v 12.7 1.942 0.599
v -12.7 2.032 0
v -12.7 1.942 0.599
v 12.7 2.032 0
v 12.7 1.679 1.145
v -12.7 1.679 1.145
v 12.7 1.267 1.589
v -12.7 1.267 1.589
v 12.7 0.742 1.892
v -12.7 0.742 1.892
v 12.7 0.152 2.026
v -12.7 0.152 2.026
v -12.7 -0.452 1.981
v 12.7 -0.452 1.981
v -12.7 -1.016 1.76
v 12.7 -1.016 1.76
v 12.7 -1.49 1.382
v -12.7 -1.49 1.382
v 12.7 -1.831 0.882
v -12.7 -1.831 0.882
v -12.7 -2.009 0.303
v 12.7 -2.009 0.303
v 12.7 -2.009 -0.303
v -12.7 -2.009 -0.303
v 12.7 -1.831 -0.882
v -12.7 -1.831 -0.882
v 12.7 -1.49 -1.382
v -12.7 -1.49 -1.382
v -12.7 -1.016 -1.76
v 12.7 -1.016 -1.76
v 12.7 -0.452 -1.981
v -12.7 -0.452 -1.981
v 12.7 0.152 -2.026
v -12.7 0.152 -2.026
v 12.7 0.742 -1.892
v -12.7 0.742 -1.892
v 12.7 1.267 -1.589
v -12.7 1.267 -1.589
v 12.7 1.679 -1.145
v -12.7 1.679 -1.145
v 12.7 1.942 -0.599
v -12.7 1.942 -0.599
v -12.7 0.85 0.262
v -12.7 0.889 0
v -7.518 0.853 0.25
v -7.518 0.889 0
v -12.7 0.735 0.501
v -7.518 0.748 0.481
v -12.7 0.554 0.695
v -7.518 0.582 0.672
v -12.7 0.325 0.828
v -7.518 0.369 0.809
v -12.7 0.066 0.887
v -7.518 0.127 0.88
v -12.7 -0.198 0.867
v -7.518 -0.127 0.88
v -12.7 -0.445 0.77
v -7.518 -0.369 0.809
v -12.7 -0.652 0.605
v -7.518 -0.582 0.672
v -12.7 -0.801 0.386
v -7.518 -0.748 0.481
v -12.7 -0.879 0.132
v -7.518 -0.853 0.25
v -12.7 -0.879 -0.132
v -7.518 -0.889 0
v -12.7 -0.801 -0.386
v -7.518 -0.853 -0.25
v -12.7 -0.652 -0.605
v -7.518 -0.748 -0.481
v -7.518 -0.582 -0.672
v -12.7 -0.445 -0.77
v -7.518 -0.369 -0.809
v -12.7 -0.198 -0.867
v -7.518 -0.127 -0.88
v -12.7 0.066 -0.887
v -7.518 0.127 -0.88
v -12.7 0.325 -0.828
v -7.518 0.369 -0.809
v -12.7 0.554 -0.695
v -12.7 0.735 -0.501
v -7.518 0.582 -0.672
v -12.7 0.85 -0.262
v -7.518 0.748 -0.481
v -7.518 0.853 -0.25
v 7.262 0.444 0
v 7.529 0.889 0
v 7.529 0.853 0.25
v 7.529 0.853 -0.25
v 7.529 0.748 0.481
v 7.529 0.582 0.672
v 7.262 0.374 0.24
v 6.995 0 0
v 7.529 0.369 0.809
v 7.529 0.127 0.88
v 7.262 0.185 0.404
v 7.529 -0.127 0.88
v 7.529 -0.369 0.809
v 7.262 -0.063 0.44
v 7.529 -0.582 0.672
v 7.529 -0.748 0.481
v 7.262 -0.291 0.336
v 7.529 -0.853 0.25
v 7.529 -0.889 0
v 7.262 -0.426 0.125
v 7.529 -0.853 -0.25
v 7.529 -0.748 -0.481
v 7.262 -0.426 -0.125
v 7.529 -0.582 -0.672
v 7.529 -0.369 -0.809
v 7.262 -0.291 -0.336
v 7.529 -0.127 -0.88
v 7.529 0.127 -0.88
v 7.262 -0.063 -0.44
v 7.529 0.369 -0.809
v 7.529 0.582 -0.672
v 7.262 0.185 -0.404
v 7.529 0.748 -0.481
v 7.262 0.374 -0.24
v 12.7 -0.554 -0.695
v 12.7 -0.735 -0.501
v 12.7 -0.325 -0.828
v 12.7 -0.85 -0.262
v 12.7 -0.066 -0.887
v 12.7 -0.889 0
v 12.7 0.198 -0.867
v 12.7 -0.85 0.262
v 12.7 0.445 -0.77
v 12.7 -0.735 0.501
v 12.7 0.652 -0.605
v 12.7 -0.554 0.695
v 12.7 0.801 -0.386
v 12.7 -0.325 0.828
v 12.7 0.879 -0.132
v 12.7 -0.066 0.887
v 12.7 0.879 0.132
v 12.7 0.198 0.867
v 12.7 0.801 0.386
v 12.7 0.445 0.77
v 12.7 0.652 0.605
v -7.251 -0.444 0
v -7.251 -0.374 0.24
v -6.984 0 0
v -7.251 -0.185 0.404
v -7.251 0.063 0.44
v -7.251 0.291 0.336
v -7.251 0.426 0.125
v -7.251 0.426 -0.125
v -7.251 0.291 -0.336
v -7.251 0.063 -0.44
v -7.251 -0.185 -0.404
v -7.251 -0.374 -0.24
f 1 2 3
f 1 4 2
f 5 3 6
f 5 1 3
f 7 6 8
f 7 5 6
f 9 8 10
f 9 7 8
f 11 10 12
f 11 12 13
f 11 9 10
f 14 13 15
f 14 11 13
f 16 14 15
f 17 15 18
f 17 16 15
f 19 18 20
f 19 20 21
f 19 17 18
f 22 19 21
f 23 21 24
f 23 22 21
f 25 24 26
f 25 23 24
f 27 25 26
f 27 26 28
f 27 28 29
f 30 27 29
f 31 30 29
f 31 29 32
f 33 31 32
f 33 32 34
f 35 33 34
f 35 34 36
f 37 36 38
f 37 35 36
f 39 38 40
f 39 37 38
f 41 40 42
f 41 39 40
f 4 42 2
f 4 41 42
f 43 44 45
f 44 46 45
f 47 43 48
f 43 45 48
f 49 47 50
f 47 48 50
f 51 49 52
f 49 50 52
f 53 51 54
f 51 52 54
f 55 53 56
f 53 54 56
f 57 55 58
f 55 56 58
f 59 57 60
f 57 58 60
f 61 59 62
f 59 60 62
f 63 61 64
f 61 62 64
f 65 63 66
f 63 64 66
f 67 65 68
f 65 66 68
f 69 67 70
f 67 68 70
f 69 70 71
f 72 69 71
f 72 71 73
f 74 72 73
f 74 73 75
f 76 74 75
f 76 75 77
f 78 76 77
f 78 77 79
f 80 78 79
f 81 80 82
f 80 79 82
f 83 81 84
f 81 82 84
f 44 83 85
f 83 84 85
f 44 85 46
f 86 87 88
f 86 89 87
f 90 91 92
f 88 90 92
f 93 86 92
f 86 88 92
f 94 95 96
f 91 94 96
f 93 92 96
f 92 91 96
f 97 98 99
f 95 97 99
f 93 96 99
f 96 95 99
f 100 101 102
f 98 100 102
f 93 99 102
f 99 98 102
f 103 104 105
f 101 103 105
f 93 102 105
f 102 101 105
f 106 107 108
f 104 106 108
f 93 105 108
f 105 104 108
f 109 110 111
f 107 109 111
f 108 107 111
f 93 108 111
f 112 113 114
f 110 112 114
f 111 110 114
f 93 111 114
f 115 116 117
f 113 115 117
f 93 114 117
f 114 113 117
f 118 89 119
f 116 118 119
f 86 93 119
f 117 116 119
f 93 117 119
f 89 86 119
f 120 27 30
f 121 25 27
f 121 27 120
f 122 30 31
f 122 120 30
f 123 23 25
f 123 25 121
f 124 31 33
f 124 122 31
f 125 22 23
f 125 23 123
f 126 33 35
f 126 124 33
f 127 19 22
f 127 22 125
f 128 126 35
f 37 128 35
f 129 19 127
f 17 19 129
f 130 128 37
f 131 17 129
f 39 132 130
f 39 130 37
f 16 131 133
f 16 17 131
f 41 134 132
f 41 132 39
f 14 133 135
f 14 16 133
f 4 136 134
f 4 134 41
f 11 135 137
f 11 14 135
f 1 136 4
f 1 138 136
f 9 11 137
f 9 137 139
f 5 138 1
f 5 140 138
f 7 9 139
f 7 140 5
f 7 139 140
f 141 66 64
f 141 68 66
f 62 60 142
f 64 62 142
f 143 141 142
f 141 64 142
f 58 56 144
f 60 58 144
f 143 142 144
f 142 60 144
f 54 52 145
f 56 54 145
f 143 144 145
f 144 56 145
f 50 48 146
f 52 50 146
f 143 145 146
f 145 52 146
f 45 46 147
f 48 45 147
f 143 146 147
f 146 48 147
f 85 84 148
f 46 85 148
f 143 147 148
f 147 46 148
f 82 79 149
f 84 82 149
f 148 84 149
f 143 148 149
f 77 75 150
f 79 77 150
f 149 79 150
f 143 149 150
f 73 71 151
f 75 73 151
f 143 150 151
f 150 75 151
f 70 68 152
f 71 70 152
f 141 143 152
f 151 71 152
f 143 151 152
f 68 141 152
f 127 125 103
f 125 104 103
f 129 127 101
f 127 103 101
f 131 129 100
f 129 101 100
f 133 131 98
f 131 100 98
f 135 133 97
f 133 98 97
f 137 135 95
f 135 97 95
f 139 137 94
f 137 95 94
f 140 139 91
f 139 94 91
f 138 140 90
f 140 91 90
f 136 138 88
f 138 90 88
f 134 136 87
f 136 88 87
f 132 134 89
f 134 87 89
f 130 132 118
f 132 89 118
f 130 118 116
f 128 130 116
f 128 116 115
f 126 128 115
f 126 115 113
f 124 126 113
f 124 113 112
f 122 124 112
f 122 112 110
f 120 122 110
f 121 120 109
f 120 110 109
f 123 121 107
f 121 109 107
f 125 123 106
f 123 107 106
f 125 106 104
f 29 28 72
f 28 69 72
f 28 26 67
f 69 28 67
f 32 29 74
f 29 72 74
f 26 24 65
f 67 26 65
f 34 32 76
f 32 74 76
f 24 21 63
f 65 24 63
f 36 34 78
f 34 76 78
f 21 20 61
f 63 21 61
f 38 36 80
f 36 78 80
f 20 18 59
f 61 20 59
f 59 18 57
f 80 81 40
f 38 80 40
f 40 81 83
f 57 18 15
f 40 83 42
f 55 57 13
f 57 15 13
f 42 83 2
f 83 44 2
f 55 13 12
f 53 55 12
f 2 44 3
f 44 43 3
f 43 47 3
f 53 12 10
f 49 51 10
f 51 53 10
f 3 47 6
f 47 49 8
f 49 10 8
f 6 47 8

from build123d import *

# Parameters (mm, degrees)
F0_R     = 2.032
F1_DEPTH = 12.7
F3_D     = 1.778
F3_DEPTH = 5.1707142857
F3_TIP   = 0.5341650903
F5_D     = 1.778
F5_DEPTH = 5.1816
F5_TIP   = 0.5341650903


with BuildPart() as f1:
    # F0 (on Right) → F1 (new body, symmetric)
    with BuildSketch(Plane.YZ):
        Circle(F0_R)
    extrude(amount=F1_DEPTH, both=True)

    # F3
    with Locations(Plane.YZ.offset(12.7)):
        with Locations((0, 0)):
            Hole(F3_D / 2, depth=F3_DEPTH)
            with Locations((0, 0, -(F3_DEPTH + F3_TIP / 2))):  # 118° drill point
                Cone(0, F3_D / 2, F3_TIP, mode=Mode.SUBTRACT)

    # F5
    with Locations(Plane(origin=(-12.7, 0, 0), x_dir=(0, -1, 0), z_dir=(-1, 0, 0))):
        with Locations((0, 0)):
            Hole(F5_D / 2, depth=F5_DEPTH)
            with Locations((0, 0, -(F5_DEPTH + F5_TIP / 2))):  # 118° drill point
                Cone(0, F5_D / 2, F5_TIP, mode=Mode.SUBTRACT)


solid = f1.part
